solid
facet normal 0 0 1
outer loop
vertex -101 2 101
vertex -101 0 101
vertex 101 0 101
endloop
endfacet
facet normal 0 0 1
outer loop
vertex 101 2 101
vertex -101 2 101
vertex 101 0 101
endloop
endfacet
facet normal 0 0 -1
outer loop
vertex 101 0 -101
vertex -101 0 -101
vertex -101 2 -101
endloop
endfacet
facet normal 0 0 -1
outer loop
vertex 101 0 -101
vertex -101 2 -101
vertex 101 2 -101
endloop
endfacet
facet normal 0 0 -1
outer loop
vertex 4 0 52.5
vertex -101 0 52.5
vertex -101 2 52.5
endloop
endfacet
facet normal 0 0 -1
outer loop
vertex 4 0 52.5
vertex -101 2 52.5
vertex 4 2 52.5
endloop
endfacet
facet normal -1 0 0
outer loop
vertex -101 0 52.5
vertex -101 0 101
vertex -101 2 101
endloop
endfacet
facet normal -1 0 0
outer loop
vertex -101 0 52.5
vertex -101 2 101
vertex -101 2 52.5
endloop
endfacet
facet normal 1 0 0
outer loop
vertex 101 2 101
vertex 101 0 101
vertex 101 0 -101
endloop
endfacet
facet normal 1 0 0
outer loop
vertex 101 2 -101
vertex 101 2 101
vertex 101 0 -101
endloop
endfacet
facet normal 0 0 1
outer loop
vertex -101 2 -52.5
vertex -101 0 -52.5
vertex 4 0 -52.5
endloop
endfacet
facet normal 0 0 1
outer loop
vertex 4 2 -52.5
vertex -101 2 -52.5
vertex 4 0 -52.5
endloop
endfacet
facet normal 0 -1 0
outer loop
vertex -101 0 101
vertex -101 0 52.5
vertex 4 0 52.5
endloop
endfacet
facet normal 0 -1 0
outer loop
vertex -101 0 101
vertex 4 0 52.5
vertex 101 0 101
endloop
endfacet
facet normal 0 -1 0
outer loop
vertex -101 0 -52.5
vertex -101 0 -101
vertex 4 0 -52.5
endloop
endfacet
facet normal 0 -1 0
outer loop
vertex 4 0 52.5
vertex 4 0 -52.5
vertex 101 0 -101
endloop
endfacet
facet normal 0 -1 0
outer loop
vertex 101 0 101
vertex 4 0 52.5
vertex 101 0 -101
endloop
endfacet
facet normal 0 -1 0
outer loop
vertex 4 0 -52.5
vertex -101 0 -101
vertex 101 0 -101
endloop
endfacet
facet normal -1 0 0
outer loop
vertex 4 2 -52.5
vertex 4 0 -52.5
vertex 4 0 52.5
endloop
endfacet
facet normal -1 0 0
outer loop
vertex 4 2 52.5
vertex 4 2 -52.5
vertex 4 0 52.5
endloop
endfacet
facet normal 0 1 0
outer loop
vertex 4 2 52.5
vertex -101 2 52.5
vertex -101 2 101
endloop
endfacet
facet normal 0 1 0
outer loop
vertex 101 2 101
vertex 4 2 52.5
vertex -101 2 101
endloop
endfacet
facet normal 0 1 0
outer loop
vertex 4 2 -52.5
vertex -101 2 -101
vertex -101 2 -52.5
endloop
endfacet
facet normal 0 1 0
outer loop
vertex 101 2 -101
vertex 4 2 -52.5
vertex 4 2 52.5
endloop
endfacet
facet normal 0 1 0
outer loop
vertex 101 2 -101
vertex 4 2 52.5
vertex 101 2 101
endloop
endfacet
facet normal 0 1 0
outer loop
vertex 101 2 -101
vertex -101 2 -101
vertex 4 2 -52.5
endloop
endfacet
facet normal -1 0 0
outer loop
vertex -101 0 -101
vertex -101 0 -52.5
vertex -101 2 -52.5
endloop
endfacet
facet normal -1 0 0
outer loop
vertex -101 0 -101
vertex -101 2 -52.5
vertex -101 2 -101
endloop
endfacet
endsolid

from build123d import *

# Parameters (mm, degrees)
SKETCH1_W           = 202
SKETCH1_H           = 202
BOSS_EXTRUDE1_DEPTH = 2
CUT_EXTRUDE1_REACH  = 144.85
SKETCH2_W           = 105
SKETCH2_H           = 105


with BuildPart() as part:
    # Sketch1 → Boss-Extrude1 (new body)
    with BuildSketch(Plane(origin=(0, 0, 0), x_dir=(1, 0, 0), z_dir=(0, 1, 0))):
        Rectangle(SKETCH1_W, SKETCH1_H)
    extrude(amount=BOSS_EXTRUDE1_DEPTH)

    # Sketch2 → Cut-Extrude1 (cut, up to next)
    with BuildSketch(Plane.XZ, mode=Mode.PRIVATE) as cut_extrude1_sk1:
        with Locations((-48.5, 0)):
            Rectangle(SKETCH2_W, SKETCH2_H)
    cut_extrude1_tool1 = extrude(cut_extrude1_sk1.sketch, amount=-CUT_EXTRUDE1_REACH, mode=Mode.PRIVATE) & part.part
    add(cut_extrude1_tool1.solids().sort_by_distance((-48.5, 0, 0))[0], mode=Mode.SUBTRACT)


solid = part.part
